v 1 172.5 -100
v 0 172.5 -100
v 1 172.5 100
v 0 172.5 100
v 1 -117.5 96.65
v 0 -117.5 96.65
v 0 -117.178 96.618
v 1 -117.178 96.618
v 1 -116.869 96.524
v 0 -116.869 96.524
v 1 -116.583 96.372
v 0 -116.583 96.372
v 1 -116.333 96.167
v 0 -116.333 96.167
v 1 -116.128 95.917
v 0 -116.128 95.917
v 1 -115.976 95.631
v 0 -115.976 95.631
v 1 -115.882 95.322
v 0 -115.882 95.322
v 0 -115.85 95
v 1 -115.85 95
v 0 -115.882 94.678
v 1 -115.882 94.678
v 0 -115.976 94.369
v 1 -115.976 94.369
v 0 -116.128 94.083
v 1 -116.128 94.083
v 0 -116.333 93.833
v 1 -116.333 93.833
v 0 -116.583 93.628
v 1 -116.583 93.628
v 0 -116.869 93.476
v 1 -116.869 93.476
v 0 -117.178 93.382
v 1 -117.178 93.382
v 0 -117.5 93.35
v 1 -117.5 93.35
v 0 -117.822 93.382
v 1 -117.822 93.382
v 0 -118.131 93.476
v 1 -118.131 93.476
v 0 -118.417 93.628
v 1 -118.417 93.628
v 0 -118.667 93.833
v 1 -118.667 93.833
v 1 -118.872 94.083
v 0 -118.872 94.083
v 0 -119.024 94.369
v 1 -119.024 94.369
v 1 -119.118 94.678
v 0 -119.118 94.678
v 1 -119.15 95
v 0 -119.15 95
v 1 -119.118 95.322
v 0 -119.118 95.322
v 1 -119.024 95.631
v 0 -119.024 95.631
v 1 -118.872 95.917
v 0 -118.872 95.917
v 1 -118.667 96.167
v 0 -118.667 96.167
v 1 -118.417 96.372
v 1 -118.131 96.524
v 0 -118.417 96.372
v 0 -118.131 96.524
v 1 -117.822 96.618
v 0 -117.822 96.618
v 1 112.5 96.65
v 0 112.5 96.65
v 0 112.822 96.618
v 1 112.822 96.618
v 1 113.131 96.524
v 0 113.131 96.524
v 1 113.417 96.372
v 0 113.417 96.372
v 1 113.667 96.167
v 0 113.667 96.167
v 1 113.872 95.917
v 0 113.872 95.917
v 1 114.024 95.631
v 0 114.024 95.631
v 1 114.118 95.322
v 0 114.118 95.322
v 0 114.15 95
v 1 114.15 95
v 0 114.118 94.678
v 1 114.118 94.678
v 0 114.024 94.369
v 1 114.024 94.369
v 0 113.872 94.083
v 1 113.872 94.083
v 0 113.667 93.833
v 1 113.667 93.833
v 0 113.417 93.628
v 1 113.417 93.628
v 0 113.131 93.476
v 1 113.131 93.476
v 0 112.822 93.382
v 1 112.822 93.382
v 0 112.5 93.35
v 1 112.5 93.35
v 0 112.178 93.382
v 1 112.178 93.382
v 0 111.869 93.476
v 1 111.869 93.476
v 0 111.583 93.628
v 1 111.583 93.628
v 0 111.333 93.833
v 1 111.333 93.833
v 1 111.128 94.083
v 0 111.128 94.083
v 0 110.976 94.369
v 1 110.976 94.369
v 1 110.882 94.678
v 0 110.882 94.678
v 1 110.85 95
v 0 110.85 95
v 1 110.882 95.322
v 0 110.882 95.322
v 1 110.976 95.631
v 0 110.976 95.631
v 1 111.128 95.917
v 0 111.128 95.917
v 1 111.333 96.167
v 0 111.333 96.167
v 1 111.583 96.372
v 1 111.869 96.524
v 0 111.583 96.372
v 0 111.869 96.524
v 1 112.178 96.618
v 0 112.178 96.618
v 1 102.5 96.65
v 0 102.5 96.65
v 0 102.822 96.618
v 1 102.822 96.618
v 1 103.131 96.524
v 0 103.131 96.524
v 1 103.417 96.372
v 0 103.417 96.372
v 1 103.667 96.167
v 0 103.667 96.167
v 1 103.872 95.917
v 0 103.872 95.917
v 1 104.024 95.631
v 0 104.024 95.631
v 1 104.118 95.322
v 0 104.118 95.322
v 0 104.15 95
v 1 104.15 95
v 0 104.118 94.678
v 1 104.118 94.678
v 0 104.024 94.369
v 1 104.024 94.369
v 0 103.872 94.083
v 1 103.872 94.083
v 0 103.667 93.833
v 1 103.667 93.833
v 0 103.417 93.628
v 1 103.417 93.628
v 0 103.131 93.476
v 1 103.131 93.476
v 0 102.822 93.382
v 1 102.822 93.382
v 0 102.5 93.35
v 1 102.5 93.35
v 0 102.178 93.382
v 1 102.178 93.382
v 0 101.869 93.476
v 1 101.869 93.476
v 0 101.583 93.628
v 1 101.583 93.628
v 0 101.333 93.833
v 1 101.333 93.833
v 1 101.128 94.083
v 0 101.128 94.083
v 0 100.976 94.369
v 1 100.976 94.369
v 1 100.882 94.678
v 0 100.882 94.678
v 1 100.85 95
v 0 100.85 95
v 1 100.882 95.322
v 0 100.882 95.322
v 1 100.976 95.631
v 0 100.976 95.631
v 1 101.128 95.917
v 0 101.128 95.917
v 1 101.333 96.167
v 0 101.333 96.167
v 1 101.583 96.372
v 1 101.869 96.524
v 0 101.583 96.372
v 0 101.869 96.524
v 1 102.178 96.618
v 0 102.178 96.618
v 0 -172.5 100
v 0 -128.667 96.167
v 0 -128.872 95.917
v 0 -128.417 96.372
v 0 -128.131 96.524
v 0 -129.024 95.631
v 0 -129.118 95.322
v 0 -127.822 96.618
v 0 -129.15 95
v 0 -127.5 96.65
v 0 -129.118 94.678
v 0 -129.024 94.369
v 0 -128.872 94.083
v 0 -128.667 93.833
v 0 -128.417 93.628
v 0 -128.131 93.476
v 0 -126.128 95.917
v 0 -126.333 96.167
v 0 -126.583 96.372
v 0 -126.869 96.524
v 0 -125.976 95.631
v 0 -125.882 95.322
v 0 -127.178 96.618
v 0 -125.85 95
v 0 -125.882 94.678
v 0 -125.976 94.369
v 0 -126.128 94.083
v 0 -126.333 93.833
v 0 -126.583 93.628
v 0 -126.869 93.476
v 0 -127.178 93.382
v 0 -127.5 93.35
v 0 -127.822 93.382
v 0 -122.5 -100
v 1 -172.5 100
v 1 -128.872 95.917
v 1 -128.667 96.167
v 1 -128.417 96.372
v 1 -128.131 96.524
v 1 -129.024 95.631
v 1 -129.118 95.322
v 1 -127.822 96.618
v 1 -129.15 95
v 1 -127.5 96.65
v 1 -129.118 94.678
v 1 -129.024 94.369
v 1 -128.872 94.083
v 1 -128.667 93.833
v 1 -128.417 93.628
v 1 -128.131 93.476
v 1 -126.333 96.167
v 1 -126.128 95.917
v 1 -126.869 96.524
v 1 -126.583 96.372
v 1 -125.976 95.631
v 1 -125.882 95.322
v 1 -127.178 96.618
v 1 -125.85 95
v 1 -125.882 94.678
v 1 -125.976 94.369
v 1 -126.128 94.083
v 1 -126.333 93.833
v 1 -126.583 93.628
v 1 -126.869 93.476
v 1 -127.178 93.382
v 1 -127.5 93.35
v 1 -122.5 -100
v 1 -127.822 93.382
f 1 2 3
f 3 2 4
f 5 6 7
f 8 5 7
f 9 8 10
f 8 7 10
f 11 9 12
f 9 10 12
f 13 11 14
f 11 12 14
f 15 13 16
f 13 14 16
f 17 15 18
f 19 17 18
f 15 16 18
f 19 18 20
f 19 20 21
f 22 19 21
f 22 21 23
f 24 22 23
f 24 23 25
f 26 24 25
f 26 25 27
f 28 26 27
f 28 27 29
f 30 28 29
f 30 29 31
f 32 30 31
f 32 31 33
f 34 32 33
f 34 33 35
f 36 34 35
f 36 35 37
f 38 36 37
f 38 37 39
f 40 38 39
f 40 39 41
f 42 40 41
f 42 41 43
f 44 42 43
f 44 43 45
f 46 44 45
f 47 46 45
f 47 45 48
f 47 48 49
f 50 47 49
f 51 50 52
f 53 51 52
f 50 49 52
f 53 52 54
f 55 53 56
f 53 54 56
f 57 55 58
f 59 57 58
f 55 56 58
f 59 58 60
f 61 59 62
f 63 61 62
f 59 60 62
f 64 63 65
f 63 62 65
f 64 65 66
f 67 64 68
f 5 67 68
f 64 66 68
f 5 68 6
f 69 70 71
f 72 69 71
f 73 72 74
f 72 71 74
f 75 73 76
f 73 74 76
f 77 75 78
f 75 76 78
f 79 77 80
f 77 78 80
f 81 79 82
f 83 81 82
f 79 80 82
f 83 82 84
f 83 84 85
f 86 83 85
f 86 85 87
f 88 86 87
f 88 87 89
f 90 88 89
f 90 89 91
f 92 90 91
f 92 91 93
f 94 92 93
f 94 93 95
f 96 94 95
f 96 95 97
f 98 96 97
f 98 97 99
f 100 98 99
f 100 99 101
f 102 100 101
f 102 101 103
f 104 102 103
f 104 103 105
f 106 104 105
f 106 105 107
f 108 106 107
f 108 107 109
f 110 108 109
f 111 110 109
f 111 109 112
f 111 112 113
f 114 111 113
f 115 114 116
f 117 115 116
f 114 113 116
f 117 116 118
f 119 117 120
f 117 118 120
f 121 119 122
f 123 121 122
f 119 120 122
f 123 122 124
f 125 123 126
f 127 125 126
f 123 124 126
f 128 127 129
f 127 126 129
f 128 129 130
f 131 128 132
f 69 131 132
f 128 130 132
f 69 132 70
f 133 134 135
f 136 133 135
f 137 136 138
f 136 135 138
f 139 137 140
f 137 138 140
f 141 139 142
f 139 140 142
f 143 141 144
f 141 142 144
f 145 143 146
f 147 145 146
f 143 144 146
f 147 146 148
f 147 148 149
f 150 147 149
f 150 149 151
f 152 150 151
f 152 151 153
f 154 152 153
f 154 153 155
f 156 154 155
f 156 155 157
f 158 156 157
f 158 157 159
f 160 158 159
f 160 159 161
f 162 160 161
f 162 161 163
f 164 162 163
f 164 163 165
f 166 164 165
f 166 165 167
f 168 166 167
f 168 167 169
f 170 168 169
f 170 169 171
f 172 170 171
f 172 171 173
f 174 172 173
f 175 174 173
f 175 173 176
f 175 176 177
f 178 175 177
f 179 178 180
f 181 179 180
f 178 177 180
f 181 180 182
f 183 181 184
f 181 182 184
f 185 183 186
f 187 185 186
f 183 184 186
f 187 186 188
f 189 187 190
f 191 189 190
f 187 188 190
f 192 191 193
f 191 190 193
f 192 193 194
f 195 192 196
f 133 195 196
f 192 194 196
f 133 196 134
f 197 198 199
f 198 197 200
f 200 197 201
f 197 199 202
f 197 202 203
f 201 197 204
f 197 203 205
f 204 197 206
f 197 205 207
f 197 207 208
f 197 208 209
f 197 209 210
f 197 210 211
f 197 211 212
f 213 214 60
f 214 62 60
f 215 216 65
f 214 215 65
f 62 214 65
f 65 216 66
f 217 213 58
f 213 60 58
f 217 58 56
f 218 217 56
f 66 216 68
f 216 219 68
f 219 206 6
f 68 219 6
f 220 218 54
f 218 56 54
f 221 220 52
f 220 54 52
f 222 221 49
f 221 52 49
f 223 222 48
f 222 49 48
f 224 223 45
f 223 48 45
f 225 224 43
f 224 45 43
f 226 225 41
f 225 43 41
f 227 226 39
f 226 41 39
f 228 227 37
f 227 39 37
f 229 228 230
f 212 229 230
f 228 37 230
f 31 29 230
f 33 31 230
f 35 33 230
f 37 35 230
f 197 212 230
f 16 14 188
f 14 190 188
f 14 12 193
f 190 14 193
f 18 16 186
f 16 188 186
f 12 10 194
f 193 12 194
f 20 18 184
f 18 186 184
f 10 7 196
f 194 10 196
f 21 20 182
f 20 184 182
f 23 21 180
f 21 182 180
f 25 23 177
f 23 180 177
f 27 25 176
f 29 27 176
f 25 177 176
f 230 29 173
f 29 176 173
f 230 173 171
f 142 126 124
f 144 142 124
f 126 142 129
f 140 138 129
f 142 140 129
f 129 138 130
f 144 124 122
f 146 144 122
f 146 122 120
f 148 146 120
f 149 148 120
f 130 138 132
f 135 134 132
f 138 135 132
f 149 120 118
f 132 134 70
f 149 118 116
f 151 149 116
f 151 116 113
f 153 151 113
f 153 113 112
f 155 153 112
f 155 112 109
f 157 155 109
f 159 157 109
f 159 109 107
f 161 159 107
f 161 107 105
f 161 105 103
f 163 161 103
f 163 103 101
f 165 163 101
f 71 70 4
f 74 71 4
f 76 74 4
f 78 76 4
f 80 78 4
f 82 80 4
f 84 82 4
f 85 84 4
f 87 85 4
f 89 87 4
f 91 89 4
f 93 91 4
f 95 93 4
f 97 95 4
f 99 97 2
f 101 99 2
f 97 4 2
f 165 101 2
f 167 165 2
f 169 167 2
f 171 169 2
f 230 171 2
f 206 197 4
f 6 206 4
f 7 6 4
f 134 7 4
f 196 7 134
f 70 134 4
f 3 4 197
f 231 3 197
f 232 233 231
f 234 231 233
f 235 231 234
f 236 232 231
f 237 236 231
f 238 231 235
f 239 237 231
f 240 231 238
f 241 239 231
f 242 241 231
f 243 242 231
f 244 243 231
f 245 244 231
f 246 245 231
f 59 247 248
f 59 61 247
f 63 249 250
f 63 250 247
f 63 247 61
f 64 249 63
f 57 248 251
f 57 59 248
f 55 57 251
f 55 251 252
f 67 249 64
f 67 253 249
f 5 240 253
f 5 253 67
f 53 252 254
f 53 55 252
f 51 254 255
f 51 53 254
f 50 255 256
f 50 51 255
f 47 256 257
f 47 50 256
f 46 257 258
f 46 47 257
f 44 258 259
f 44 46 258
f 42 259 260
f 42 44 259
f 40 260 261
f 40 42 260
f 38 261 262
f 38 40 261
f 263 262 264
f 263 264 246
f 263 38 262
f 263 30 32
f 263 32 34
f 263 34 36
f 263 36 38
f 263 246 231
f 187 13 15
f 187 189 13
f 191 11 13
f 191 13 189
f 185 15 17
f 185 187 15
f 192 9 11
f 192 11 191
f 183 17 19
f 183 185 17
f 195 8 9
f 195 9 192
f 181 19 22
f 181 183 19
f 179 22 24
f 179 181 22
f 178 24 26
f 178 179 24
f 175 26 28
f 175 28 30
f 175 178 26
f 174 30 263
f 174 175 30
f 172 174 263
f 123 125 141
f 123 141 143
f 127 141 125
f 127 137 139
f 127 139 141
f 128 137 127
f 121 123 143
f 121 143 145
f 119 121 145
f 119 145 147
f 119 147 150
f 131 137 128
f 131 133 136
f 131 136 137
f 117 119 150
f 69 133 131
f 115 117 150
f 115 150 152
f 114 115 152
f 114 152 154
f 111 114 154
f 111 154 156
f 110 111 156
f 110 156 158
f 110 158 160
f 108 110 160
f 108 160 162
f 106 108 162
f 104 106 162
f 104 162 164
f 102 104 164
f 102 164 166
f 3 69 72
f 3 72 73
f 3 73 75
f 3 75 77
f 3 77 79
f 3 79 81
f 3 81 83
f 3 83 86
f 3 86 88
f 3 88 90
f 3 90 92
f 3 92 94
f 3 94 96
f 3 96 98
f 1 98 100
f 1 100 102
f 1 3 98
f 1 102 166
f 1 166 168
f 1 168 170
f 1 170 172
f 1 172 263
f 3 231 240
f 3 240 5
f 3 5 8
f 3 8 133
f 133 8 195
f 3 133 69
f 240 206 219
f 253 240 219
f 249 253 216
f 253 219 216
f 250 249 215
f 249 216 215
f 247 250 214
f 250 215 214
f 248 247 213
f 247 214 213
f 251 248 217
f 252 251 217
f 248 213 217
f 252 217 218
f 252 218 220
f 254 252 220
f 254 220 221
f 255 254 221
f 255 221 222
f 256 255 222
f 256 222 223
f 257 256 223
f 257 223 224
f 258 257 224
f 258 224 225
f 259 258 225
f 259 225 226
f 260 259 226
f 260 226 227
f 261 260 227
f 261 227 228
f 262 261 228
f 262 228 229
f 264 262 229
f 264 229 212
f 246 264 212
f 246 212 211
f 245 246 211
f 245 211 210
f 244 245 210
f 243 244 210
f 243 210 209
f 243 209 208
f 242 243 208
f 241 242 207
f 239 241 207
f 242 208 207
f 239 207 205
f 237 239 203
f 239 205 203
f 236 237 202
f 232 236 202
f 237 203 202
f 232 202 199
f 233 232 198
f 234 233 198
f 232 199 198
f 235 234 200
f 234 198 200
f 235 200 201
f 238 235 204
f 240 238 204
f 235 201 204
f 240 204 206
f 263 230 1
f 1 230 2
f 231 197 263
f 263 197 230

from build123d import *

# Parameters (mm, degrees)
BOSS_EXTRUDE1_DEPTH   = 1
M4X0_7_TAPPED_HOLE1_D = 3.3


with BuildPart() as part:
    # Sketch1 → Boss-Extrude1 (new body)
    with BuildSketch(Plane(origin=(0, 0, 0), x_dir=(0, 0, -1), z_dir=(1, 0, 0))):
        Polygon((-100, 172.5), (-100, -172.5), (100, -122.5), (100, 172.5), align=None)
    extrude(amount=BOSS_EXTRUDE1_DEPTH)

    # M4x0.7 Tapped Hole1 (through all)
    with Locations(Plane(origin=(1, 0, 0), x_dir=(0, 0, -1), z_dir=(1, 0, 0))):
        with Locations((-95, 112.5), (-95, 102.5), (-95, -117.5), (-95, -127.5)):
            Hole(M4X0_7_TAPPED_HOLE1_D / 2)


solid = part.part
